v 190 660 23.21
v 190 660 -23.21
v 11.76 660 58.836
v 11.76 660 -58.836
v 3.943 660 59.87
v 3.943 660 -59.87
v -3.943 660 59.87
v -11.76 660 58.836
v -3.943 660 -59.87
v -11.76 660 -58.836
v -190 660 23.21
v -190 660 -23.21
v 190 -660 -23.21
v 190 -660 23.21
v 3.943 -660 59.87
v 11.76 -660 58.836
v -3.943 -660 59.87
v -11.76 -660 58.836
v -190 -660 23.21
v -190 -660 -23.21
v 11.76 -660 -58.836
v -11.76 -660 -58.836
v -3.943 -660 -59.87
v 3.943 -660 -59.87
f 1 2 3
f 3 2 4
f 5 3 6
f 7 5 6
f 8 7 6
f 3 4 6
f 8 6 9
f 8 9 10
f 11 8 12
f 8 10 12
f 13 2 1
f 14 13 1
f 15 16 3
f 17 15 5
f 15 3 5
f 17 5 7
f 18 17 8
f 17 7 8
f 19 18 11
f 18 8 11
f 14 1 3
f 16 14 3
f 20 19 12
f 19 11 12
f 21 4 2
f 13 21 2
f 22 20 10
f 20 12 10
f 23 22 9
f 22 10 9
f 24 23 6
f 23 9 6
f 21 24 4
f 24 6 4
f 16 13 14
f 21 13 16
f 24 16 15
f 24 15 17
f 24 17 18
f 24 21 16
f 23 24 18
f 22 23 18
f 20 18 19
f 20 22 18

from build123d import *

# Parameters (mm, degrees)
EXTRUDE_1_DEPTH = 660


with BuildPart() as part:
    # 草图5 → 凸台-拉伸1 (new body, symmetric)
    with BuildSketch(Plane(origin=(0, 0, 0), x_dir=(1, 0, 0), z_dir=(0, 1, 0))):
        with BuildLine():
            Line((190, 0), (190, -23.210187215))
            Line((190, -23.210187215), (11.76, -58.836233734))
            ThreePointArc((11.76, -58.836233734), (0, -60), (-11.76, -58.836233734))
            Line((-11.76, -58.836233734), (-190, -23.210187215))
            Line((-190, -23.210187215), (-190, 0))
            Line((-190, 0), (-190, 23.210187215))
            Line((-190, 23.210187215), (-11.759999967, 58.836233741))
            ThreePointArc((-11.759999967, 58.836233741), (1.7e-08, 60), (11.76, 58.836233734))
            Line((11.76, 58.836233734), (190, 23.210187215))
            Line((190, 23.210187215), (190, 0))
        make_face()
    extrude(amount=EXTRUDE_1_DEPTH, both=True)


solid = part.part
